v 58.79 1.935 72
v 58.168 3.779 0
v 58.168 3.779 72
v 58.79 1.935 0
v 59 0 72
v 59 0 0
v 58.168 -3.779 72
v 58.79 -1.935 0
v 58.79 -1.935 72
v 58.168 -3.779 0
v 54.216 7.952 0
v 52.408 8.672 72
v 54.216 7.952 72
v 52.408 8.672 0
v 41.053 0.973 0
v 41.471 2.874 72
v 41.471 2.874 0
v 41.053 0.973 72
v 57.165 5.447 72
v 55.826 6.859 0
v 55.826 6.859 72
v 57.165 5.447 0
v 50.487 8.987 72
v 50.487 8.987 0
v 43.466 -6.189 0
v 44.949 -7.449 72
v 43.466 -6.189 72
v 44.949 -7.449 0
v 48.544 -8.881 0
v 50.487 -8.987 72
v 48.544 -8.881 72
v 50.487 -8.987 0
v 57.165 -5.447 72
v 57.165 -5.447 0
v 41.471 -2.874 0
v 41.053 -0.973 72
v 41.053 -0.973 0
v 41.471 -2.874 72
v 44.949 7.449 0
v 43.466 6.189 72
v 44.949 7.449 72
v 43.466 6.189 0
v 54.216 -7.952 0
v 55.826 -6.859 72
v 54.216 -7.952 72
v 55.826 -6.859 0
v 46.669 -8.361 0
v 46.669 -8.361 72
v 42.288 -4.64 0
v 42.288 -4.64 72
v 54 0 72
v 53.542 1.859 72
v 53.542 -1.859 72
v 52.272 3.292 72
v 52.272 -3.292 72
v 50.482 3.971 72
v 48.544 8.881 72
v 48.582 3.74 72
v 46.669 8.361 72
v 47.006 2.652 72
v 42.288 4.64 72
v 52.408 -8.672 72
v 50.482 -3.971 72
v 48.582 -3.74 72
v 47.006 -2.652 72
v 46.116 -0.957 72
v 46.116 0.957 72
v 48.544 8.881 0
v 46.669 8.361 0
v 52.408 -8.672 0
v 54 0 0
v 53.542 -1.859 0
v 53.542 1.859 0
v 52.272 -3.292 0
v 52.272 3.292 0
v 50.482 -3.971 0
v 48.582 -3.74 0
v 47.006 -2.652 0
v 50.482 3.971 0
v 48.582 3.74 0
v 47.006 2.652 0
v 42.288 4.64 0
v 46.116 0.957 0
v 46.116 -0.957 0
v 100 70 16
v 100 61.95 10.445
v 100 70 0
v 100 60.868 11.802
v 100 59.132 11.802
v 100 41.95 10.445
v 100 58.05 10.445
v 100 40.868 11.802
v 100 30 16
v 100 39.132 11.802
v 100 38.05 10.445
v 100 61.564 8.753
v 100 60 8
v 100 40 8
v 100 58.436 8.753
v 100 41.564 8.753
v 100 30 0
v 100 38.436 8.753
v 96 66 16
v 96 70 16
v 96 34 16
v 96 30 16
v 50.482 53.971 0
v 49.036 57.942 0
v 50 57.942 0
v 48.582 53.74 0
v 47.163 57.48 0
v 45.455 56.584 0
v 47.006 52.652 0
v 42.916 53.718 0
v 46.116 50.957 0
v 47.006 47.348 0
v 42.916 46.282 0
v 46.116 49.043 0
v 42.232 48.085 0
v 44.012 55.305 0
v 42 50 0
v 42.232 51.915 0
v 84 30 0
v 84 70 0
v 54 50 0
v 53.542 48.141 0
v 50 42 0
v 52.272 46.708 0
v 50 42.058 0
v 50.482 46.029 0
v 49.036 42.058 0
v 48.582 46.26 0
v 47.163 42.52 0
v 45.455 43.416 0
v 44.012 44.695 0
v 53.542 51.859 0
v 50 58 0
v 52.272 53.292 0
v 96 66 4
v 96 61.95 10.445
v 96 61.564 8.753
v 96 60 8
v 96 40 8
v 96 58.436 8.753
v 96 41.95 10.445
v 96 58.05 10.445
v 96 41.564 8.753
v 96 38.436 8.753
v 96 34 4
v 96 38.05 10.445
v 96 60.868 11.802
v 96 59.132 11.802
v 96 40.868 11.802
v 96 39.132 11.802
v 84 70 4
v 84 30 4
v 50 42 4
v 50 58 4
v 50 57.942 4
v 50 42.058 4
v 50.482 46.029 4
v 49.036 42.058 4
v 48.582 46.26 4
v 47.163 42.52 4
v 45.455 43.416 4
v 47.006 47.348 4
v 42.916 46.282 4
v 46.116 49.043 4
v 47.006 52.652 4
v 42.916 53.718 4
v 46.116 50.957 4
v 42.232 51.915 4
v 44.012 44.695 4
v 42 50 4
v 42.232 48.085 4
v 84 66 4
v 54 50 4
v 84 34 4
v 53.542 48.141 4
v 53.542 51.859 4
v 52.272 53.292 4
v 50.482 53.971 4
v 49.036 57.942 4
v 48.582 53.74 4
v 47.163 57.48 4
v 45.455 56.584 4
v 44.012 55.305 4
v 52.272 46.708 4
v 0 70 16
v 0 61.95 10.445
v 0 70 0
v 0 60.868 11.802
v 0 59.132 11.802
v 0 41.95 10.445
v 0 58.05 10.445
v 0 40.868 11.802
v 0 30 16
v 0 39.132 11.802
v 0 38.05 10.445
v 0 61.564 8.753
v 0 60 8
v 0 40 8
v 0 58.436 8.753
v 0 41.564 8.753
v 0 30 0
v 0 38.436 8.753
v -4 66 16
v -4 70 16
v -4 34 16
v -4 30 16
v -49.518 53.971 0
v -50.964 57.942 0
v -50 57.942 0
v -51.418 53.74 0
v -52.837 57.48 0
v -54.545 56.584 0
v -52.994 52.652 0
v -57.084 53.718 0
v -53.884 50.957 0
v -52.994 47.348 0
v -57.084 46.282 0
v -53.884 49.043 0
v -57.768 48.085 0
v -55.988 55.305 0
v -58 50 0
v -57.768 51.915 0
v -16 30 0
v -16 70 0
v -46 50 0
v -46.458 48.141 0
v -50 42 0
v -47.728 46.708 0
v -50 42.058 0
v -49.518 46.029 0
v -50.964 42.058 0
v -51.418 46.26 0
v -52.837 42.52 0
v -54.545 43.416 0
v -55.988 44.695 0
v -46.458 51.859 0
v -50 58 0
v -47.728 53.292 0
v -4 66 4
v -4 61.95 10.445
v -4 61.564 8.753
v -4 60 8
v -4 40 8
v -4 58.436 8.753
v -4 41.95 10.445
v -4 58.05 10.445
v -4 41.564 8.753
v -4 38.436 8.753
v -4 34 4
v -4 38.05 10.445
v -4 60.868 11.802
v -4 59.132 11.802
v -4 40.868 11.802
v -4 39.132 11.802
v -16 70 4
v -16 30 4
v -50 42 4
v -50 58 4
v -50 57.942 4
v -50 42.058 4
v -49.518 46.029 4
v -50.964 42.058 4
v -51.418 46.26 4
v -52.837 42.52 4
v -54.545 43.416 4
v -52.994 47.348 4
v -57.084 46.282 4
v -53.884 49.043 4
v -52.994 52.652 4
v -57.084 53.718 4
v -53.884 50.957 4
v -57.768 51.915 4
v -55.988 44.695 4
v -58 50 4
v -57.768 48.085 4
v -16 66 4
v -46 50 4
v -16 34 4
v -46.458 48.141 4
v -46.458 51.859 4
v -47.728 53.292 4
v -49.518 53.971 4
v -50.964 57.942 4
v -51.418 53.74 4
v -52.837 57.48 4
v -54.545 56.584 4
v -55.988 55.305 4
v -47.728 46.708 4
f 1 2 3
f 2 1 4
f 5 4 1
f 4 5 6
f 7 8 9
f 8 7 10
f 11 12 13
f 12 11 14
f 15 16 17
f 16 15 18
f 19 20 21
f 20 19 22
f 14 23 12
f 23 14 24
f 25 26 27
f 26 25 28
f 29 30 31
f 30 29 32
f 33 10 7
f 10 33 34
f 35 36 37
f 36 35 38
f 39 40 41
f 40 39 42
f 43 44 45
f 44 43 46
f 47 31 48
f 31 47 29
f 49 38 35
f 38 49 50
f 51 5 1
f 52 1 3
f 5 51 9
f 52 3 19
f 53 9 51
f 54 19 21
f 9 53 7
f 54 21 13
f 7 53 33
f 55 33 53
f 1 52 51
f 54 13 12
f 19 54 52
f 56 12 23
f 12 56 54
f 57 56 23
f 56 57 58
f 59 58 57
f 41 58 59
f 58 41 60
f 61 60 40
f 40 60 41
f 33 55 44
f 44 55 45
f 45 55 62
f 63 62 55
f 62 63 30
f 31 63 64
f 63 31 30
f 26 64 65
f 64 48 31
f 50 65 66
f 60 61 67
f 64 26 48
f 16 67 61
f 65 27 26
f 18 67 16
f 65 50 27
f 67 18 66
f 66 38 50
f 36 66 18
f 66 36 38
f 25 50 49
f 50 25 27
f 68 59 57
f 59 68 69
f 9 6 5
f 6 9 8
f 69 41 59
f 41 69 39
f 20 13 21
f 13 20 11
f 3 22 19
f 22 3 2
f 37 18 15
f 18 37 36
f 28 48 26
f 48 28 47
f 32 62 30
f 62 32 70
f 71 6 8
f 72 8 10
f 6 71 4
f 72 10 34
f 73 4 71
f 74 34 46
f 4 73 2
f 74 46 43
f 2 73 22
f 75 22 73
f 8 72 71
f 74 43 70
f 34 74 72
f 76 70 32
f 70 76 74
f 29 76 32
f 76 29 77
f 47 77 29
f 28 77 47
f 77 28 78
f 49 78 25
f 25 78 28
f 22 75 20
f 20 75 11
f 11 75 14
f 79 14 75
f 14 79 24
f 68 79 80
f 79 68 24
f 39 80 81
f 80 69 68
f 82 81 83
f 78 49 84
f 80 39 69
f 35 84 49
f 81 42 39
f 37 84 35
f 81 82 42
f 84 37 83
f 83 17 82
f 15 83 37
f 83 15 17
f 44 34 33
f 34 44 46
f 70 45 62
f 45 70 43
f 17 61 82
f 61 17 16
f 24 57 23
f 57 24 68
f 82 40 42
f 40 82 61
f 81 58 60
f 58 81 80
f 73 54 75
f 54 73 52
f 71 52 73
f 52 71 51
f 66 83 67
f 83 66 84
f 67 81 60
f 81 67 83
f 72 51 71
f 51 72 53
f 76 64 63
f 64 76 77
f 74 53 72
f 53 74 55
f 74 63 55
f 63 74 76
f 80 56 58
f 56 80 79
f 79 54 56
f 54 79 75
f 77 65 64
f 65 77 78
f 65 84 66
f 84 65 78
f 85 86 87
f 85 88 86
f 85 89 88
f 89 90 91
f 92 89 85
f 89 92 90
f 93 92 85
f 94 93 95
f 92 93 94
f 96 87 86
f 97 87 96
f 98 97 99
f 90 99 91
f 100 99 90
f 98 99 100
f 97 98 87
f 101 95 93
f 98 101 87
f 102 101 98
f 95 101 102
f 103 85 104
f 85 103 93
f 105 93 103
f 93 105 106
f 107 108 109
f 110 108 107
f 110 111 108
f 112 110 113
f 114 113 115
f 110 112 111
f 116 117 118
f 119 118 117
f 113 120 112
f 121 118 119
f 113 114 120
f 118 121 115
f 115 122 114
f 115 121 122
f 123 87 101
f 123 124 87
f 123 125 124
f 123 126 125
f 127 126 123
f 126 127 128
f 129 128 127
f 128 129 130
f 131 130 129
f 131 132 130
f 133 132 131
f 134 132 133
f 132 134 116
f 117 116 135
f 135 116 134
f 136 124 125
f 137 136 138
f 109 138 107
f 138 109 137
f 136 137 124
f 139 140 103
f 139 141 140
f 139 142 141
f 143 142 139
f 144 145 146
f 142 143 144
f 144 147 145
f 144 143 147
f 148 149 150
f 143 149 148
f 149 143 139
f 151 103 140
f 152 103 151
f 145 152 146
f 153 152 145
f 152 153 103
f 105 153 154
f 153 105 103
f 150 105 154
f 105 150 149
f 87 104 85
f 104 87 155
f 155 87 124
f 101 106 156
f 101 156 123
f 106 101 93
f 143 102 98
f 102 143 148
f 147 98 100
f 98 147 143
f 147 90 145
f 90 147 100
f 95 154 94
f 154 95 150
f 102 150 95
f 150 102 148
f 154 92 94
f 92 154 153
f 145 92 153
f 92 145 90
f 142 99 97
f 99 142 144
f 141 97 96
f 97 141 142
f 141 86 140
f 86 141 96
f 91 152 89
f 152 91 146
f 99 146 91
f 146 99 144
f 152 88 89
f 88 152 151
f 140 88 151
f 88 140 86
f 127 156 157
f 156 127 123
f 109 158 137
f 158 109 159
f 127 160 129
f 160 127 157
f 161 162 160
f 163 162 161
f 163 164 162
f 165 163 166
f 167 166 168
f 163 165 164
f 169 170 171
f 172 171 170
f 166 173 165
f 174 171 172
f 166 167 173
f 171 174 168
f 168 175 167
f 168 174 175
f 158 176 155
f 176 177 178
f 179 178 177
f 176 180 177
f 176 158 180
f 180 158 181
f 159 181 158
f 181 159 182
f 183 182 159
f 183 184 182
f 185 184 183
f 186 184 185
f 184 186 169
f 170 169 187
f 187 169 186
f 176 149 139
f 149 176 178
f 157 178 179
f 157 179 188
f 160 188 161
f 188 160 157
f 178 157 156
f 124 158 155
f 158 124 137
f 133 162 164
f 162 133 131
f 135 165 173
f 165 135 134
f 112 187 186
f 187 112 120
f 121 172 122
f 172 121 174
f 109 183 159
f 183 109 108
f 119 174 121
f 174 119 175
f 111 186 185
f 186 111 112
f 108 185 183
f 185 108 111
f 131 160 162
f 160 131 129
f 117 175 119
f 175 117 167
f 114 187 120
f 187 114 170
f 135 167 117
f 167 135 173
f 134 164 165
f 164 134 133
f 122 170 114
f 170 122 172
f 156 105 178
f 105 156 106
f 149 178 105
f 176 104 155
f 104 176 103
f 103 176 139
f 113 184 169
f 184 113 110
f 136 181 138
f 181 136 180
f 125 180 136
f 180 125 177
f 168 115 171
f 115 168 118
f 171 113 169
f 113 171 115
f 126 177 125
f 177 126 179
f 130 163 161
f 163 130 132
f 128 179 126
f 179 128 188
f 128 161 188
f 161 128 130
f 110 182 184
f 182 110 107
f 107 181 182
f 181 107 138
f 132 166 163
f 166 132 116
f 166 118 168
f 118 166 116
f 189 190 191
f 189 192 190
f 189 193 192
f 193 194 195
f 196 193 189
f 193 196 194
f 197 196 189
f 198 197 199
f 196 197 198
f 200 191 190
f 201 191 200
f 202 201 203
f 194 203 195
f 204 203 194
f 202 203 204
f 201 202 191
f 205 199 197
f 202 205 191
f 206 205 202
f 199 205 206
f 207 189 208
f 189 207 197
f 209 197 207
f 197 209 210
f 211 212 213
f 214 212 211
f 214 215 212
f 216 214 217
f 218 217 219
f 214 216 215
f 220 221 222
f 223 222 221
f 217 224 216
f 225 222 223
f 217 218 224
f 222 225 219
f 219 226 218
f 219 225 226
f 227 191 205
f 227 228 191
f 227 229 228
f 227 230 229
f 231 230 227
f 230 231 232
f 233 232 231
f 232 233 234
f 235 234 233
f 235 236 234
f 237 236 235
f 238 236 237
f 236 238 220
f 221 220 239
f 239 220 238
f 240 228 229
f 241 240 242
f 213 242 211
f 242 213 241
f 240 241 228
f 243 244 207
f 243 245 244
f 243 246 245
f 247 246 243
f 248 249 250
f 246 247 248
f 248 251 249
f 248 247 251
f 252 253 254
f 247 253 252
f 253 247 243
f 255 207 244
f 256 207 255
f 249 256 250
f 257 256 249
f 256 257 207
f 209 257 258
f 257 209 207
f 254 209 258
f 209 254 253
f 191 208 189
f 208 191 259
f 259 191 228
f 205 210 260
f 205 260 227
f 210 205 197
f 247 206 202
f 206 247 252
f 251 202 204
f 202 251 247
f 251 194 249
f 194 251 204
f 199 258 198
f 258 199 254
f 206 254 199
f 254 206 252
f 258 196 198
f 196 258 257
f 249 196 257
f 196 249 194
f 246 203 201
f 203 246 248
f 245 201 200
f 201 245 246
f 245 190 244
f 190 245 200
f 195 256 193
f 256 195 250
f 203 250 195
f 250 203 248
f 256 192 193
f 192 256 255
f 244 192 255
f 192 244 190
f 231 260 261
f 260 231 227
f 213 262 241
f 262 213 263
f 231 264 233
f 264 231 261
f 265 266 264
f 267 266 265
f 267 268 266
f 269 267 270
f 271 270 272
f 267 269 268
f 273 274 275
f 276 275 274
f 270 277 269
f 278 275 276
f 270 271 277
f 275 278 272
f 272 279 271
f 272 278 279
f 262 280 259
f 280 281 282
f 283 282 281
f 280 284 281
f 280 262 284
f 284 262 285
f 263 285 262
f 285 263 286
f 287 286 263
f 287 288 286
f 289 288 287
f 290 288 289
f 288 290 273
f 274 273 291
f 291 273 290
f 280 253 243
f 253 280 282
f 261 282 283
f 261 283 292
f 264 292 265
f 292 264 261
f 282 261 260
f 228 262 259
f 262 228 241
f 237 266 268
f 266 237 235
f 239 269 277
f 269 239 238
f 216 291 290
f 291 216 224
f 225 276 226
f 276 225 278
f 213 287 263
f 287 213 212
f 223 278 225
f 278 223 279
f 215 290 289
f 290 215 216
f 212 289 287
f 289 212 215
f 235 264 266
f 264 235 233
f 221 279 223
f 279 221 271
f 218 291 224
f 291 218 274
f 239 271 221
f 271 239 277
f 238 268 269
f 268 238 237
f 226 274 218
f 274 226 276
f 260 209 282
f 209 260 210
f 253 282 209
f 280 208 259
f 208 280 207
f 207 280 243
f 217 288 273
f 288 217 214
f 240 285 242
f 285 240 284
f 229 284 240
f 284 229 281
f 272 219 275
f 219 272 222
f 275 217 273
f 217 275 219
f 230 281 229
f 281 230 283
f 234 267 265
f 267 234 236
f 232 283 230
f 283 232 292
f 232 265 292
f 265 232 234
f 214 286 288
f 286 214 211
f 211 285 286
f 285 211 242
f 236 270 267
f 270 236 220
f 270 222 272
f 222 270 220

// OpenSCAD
    
shaft_d = 8 ;           // Shaft diameter
core_d = 18 ;           // Core diameter
bevel_d = 30 ;          // Bevel inner diameter
outer_d = 40 ;          // Spool outer diameter
crank_hub_d = 25 ;      // Diameter of crank hub
handle_hub_d = 10 ;     // Diameter of handle end of crank
handle_d = 4 ;          // Diameter of handle
base_fix_d = 4 ;        // Diameter of base fixing screw hole

crank_l = 40 ;          // Length of crank (between shaft and handle centres

side_t = 4 ;            // Thickness of spool side
side_rim_t = 2 ;        // Thickness of spool side rim (beveled)
crank_hub_t = 6 ;       // Thickness of crank hub
crank_arm_t = 4 ;       // Thickness of crank arm

spool_w_all = 112 ;     // Width of spool (overall between ends)
spool_w_end = 20 ;      // Width of spool (to inside of end)
spool_w_mid = spool_w_all - 2*spool_w_end ;
                        // width of spool middle spacer

shaft_nut_af = 13 ;     // Nut diameter across faces
shaft_nut_t  = 4 ;      // Nut thickness

handle_nut_af = 7 ;     // Nut diameter across faces
handle_nut_t  = 3 ;     // Nut thickness

winder_side_h = 50 ;    // Height to centre of winder shaft
winder_side_w = 40 ;    // Width base of winder side support
winder_side_t = 4 ;     // Thickness of winder side support
winder_apex_d = 16 ;    // Radius of apex of winder side support
winder_base_t = 16 ;    // Thickness at base of winder

delta = 0.1 ;           // Small value to force overlap
spacing = outer_d+10 ;  // Object spacingh (pitch)
part_gap = 10 ;         // Spacing between exploded assembly parts

// Utilities

module shaft_hole(d, l) {
        translate([0,0,-delta]) {
            cylinder(d=d, h=l+delta*2) ;
        };
}
  
module nut_recess(af, t)  {
    od = af * 2 / sqrt(3) ; // Diameter
    translate([0,0,-delta]) {
        cylinder(d=od, h=t+delta, $fn=6) ;
    }
}

module web_base(w_x, w_y, w_t) {
    // Web with corner on origin, extending along +ve X and Y axes
    // Slight negative x- and y- overlap forces merge with existing shape
    linear_extrude(height=w_t, center=true) {
        polygon(
            points=[
                [-delta, -delta], [-delta, w_y],
                [0, w_y], [w_x, 0],
                [w_x, 0], [w_x, -delta],
                ],
            paths=[[0,1,2,3,4,5,0]]
            ) ;
    }
}

module web_oriented(w_x, w_y, w_t) {
    // Web with corner on origin, extending along +ve or -ve X and Y axes
    if (w_x >= 0)
        {
        if (w_y >= 0)
            {
                web_base(w_x, w_y, w_t) ;
            }
        else // w_y < 0
            {
                // flip through x-z plane: reverse y-axis
                mirror(v=[0,1,0]) web_base(w_x, -w_y, w_t) ;
            }
        }
    else // w_x < 0
        {
        if (w_y >= 0)
            {
                // flip through y-z plane: reverse x-axis
                mirror(v=[1,0,0]) web_base(-w_x, w_y, w_t) ;
            }
        else // w_y < 0
            {
                // flip through x-z and y-z planes: reverse x- and y- axes
                mirror(v=[1,1,0]) web_base(-w_x, -w_y, w_t) ;
            }
        }
 }

module web_xz(x, y, z, w_x, w_z, w_t) {
    // Web in X-Z plane, outer corner at x, y, z
    if (y >= 0) {
        // Rotate around X maps Y to Z, Z to -Y (???)
        translate([x, y - w_t/2, z]) rotate([90,0,0]) web_oriented(w_x, w_z, w_t) ;
    }
    else { // y < 0
        translate([x, y + w_t/2, z]) rotate([90,0,0]) web_oriented(w_x, w_z, w_t) ;
    }
}

// Spool

module spool_edge(shaft_d, core_d, bevel_d, outer_d, side_t, side_rim_t) {
    // Edge in X-Y plane with centre of outer face at (0,0,0)
    union() {
        cylinder(d1=outer_d, d2=outer_d, h=side_rim_t) ;
        translate([0,0,side_rim_t]) {
            cylinder(d1=outer_d, d2=bevel_d, h=side_t-side_rim_t) ;
        } ;
    } ;
}

module pulley(d,t) {
    cylinder(d1=d, d2=d-t, h=t/2+delta) ;
    translate([0,0,t/2])
        cylinder(d1=d-t, d2=d, h=t/2+delta) ;    
}


module spool_core(d_core, w_core) {
    cylinder(d=d_core, h=w_core) ;
}

module half_spool(shaft_d, core_d, bevel_d, outer_d, side_t, side_rim_t, w_spool_end) {
    difference() {
        union() {
            spool_edge(
                shaft_d=shaft_d, core_d=core_d, bevel_d=bevel_d, outer_d=outer_d, 
                side_t=side_t, side_rim_t=side_rim_t
            );
            spool_core(d_core=core_d, w_core=w_spool_end+side_t);
        } ;
        union() {
            shaft_hole(d=shaft_d, l=w_spool_end+side_t) ;
            nut_recess(af=shaft_nut_af, t=shaft_nut_t) ;
        } ;
    }
} ;

module spool_spacer(shaft_d, core_d, w_spacer, w_spool_end) {
    difference() {
        union() {
            spool_core(d_core=core_d, w_core=spool_w_mid);
        } ;
        union() {
            shaft_hole(d=shaft_d, l=spool_w_mid) ;
        } ;
    }
} ;




module crank_handle(
        crank_l, 
        shaft_d, crank_hub_d, handle_hub_d, handle_d, 
        crank_hub_t, crank_arm_t
    ) {
    difference() {
        union() {
            cylinder(d=crank_hub_d, h=crank_hub_t) ;
            translate([0,0,crank_hub_t-delta])
                pulley(crank_hub_d, crank_hub_t) ;
            translate([crank_l/2,0,crank_arm_t/2]) 
                cube(size=[crank_l,handle_hub_d,crank_arm_t], center=true) ;
            translate([crank_l,0,0]) 
                cylinder(d=handle_hub_d, h=crank_hub_t) ;
        } ;
        union() {
            shaft_hole(d=shaft_d, l=crank_hub_t*2) ;
            nut_recess(af=shaft_nut_af, t=shaft_nut_t) ;
            translate([crank_l,0,0]) {
                shaft_hole(d=handle_d, l=crank_hub_t) ;
                nut_recess(af=handle_nut_af, t=handle_nut_t) ;
            }
        } ;
    }
}


module winder_side_support() {
    // Side in X-Y plane, shaft cente at origin, extends along +X axis
    module side_profile() {
        linear_extrude(height=winder_side_t)
            {
            polygon(
                points=[
                    [0,-winder_apex_d/2], [0,winder_apex_d/2],
                    [winder_side_h-winder_base_t,-winder_side_w/2], [winder_side_h-winder_base_t,winder_side_w/2],
                    [winder_side_h,-winder_side_w/2], [winder_side_h,winder_side_w/2]
                    ],
                paths=[[0,2,4,5,3,1,0]]
                ) ;
            }
        }
    module side_apex() {
        cylinder(h=winder_side_t, d=winder_apex_d) ;
        }
    module side_base() {
        translate([winder_side_h-winder_side_t, -winder_side_w/2, 0])
            {
                difference() {
                    cube(size=[winder_side_t, winder_side_w, winder_base_t], center=false) ;
                    translate([0, winder_side_w*0.25, winder_base_t/2+winder_side_t/2])
                        rotate([0,90,0])
                            shaft_hole(base_fix_d, winder_side_t) ;
                    translate([0, winder_side_w*0.75, winder_base_t/2+winder_side_t/2])
                        rotate([0,90,0])
                            shaft_hole(base_fix_d, winder_side_t) ;
                }
            }
        }
    difference()
        {
        union()
            {
                side_profile() ;
                side_apex() ;
                side_base() ;
                web_side = winder_base_t - winder_side_t ;
                web_xz(winder_side_h-winder_side_t, -winder_side_w/2, winder_side_t, -web_side, web_side, winder_side_t) ;
                web_xz(winder_side_h-winder_side_t,  winder_side_w/2, winder_side_t, -web_side, web_side, winder_side_t) ;
            } ;
        union()
            {
                shaft_hole(shaft_d, winder_side_t) ;
            } ;
        }
}

// Tape reader bridge (with lighting groove) and supports

read_l = spool_w_all ;  // Reader bridge length (inner)
read_w = 16 ;           // Width of bridge
read_extra_w = 5 ;      // Extra width for reader bridge for tie-down
read_h = 90 ;           // Height of reader bridge above base plate
read_side_t = side_t ;  // Reader bridge side support thickness
read_side_base_t = 16 ; // Reader bridge side support thickness at base 

read_side_apex_w = 24 ;
read_side_apex_h = 4 ;
read_side_base_w = 40 ;
read_side_peg_d  = 4 ;

read_groove_w = 2.25 ;  // EL wire goove width
read_groove_d = 3 ;     // EL wire groove depth

module tape_reader_bridge() {
    total_l = read_l + 2*(read_side_t + read_extra_w) ;
    difference() {
        rotate([0,90,0])
            cylinder(d=read_w, h=total_l, center=true) ;
        translate([0,0,-read_w/2])
            cube(size=[total_l+delta, read_w+delta, read_w+delta], center=true) ;

        translate([0,0,(read_w-read_groove_d)/2])
            cube(size=[total_l+delta, read_groove_w, read_groove_d], center=true) ;
    }
}

module read_side_support() {
    // Side in X-Y plane, shaft cente at origin, extends along +X axis
    module side_profile() {
        base_h = read_side_t + (read_side_base_t - read_side_t) ;
        linear_extrude(height=winder_side_t)
            {
            polygon(
                points=[
                    [0,-read_w/2], [0,read_w/2],
                    [-read_side_apex_h,-read_w/2], [-read_side_apex_h,read_w/2],
                    [-read_side_apex_h,-read_side_apex_w/2], [-read_side_apex_h,read_side_apex_w/2],
                    [read_h-base_h,-read_side_base_w/2], [read_h-base_h,read_side_base_w/2],
                    [read_h,-read_side_base_w/2], [read_h,read_side_base_w/2],
                    ],
                paths=[[0,2,4,6,8, 9,7,5,3,1, 0]]
                ) ;
            }
        }
    module side_base() {
        translate([read_h-read_side_t, -read_side_base_w/2, 0])
            {
                difference() {
                    cube(size=[read_side_t, read_side_base_w, read_side_base_t], center=false) ;
                    translate([0, read_side_base_w*0.25, read_side_base_t/2+read_side_t/2])
                        rotate([0,90,0])
                            shaft_hole(read_side_peg_d, read_side_t) ;
                    translate([0, read_side_base_w*0.75, read_side_base_t/2+read_side_t/2])
                        rotate([0,90,0])
                            shaft_hole(read_side_peg_d, read_side_t) ;
                }
            }
        }
    difference()
        {
        union()
            {
                side_profile() ;
                side_base() ;
                web_side = read_side_base_t - read_side_t ;
                web_xz(read_h-read_side_t, -read_side_base_w/2, read_side_t, -web_side, web_side, read_side_t) ;
                web_xz(read_h-read_side_t,  read_side_base_w/2, read_side_t, -web_side, web_side, read_side_t) ;
            } ;
        union()
            {
                shaft_hole(shaft_d, read_side_t) ;
                translate([read_h-read_side_base_t-read_side_t, +0.25*read_side_base_w,0])
                    shaft_hole(read_side_peg_d, read_side_t) ;
                translate([read_h-read_side_base_t-read_side_t, -0.25*read_side_base_w,0])
                    shaft_hole(read_side_peg_d, read_side_t) ;
            } ;
        }
}

// Parts for holding phone camera

hold_side_l = 80 ;      // Length is side of holder
hold_side_h = 10 ;      // Height of side above base
hold_side_t1 = 7 ;      // Thickness of side at base
hold_side_t2 = 8 ;      // Thickness of side at top

hold_base_l1 = 60 ;     // Length of base near side
hold_base_l2 = 50 ;     // Length of base towards centre
hold_base_t = 8 ;       // Thickness of base (to accommodate hole)
hold_base_w = 20 ;      // Width of base piece

hold_rail_p = 40 ;      // Distance between rail holes
hold_rail_d = 4 ;       // Diameter of rail holes

hold_fix_p = 25 ;       // Distance between fixing holes
hold_fix_d = 4 ;        // Diameter of fixing holes

hold_fix_t = 6 ;        // Thickness of phone holder-to-rod fixing
hold_fix_w = 8 ;        // Width of phone holder-to-rod fixing
hold_fix_l = 80 ;       // Length of phone holder-to-rod fixing
hold_fix_rod_d = 8 ;    // Diameter of phone holder support rod
hold_fix_hub_d = 16 ;   // Diameter of phone holder support hub

module phone_holder_rod_fixing() {
    module phone_holder_rod_fixing_shape() {
        // Centre hub on origin, extend X axis, lying on Z=0 plane
        union() {
            cylinder(d=hold_fix_hub_d, h=hold_fix_t) ;
            translate([0,-hold_fix_w/2,0])
                cube(size=[hold_fix_l, hold_fix_w, hold_fix_t], center=false) ;
            translate([hold_fix_l,0,0])
                cylinder(d=hold_fix_w, h=hold_fix_t) ;
        }
    }
    difference() {
        phone_holder_rod_fixing_shape() ;
        shaft_hole(hold_fix_rod_d, hold_fix_t ) ;
        translate([0,0,0])
            rotate([0,0,0])
                union() {
                    translate([hold_fix_l-hold_fix_d,0,0])
                        shaft_hole(hold_fix_d, hold_fix_w ) ;
                    translate([hold_fix_l-hold_fix_p-hold_fix_d,0,0])
                        shaft_hole(hold_fix_d, hold_fix_w ) ;
                } ;
    } ;
}

module phone_camera_holder() {
    module phone_holder_base() {
        // Centre baseline on origin, extend X axis, lying on Z=0 plane
        linear_extrude(height=hold_base_t)
            {
            polygon(
                points=[
                    [-hold_base_l1/2,0], [+hold_base_l1/2,0],
                    [-hold_base_l2/2,hold_base_w], [+hold_base_l2/2,hold_base_w]
                    ],
                paths=[[0,2,3,1,0]]
                ) ;
            }
        }
    module phone_holder_side() {
        // Thinner edge on Y axis, centred on X axis
        rotate([0,-90,0])
            linear_extrude(height=hold_side_l, center=true)
                {
                polygon(
                    points=[
                        [0, -delta], 
                        [hold_side_t1,-delta],
                        [-delta,hold_side_h], 
                        [hold_side_t2,hold_side_h],
                        ],
                    paths=[[0,2,3,1,0]]
                    ) ;
                } ;
        }
    difference() {
        union() {
            rotate([90,0,0]) {
                    phone_holder_base() ;
                }
            phone_holder_side() ;
            } ;
        union() {
            translate([-hold_rail_p/2,-hold_base_t/2,0])
                shaft_hole(hold_rail_d, hold_base_w) ;
            translate([+hold_rail_p/2,-hold_base_t/2,0])
                shaft_hole(hold_rail_d, hold_base_w) ;
            translate([-hold_fix_p/2,hold_side_h,hold_side_t2/2])
                rotate([90,0,0])
                    shaft_hole(hold_fix_d, hold_base_t+hold_side_h);
            translate([+hold_fix_p/2,hold_side_h,hold_side_t2/2])
                rotate([90,0,0])
                    shaft_hole(hold_fix_d, hold_base_t+hold_side_h);
            } ;
        }
    }


// Bracket to hold phone camera support rod

rod_support_h = 40 ;
rod_support_t = side_t ;  // Rod support side support thickness
rod_support_base_t = 16 ; // Rod support side support thickness at base 

rod_support_apex_w = 24 ;
rod_support_base_w = 45 ;
    
 module phone_holder_rod_support() {
    // Side in X-Y plane, shaft cente at origin, extends along +X axis
    module side_profile() {
        linear_extrude(height=winder_side_t) {
            polygon(
                points=[
                    [0,-rod_support_apex_w/2], [0,rod_support_apex_w/2],
                    [rod_support_h-rod_support_base_t,-rod_support_base_w/2], [rod_support_h-rod_support_base_t,rod_support_base_w/2],
                    [rod_support_h,-rod_support_base_w/2], [rod_support_h,rod_support_base_w/2],
                    ],
                paths=[[0,2,4,6,8, 9,7,5,3,1, 0]]
                ) ;
        }
    }
    module side_base() {
        translate([rod_support_h-rod_support_t, -rod_support_base_w/2, 0]) {
            difference() {
                cube(size=[rod_support_t, rod_support_base_w, rod_support_base_t], center=false) ;
                translate([0, rod_support_base_w*0.25, rod_support_base_t/2+rod_support_t/2])
                    rotate([0,90,0])
                        shaft_hole(base_fix_d, rod_support_t) ;
                translate([0, rod_support_base_w*0.75, rod_support_base_t/2+rod_support_t/2])
                    rotate([0,90,0])
                        shaft_hole(base_fix_d, rod_support_t) ;
            }
        }
    }
    module rod_holder() {
        // Rod support block centred on X-Y plane, rod hole aligned with X-axis
        // @@QUESTIONB: Should this be spaced away from the side plate to allow a nut on the rod?
        holder_wdth = hold_fix_rod_d*2 ;
        holder_dpth = rod_support_t*2+hold_fix_rod_d ;
        difference() {
            union() {               
                translate([0,0,holder_wdth/4])
                    cube(size=[rod_support_t, holder_wdth, holder_wdth/2], center=true) ;
                translate([0,0,holder_dpth/2])
                    rotate([0,90,0])
                        cylinder(d=holder_dpth,h=rod_support_t, center=true) ;
            }
            translate([-rod_support_t/2,0,rod_support_t+hold_fix_rod_d/2])
                rotate([0,90,0])
                    shaft_hole(hold_fix_rod_d, rod_support_t) ;
        }
    }
    union() {
        side_profile() ;
        side_base() ;
        translate([rod_support_t/2,0,0])
            rod_holder() ;
        translate([rod_support_h*0.75,0,0])
            rod_holder() ;
        web_side = rod_support_base_t - rod_support_t ;
        web_xz(rod_support_h-rod_support_t, -rod_support_base_w/2, rod_support_t, -web_side, web_side, rod_support_t) ;
        web_xz(rod_support_h-rod_support_t,  rod_support_base_w/2, rod_support_t, -web_side, web_side, rod_support_t) ;
    } ;
}


module winder_assembly() {
    // Spool and crank handle
    spool_pos_x   = side_t + spool_w/2 + part_gap/2 ;
    winder_side_x = winder_side_t + spool_w/2 + part_gap/2 + part_gap ;
    winder_pos_x  = winder_side_x + 2*part_gap ;
    translate([-spool_pos_x,0,winder_side_h])
        rotate([0,90,0])
            half_spool(
                shaft_d=shaft_d, core_d=core_d, bevel_d=bevel_d, outer_d=outer_d, 
                side_t=side_t, side_rim_t=side_rim_t, w_spool_end=spool_w_end
                );
    translate([spool_pos_x,0,winder_side_h])
        rotate([0,-90,0])
            half_spool(
                shaft_d=shaft_d, core_d=core_d, bevel_d=bevel_d, outer_d=outer_d, 
                side_t=side_t, side_rim_t=side_rim_t, w_spool_end=spool_w_end
                );
    translate([winder_pos_x,0,winder_side_h])
        rotate([-45,0,0])
            rotate([0,90,0])
                crank_handle(
                    crank_l=crank_l, 
                    shaft_d=shaft_d, crank_hub_d=crank_hub_d, 
                    handle_hub_d=handle_hub_d, handle_d=handle_d, 
                    crank_hub_t=crank_hub_t, crank_arm_t=crank_arm_t
                    ) ;
    // Winder supports
    translate([winder_side_x,0,winder_side_h])
        rotate([0,90,180])
            winder_side_support() ;
    translate([-winder_side_x,0,winder_side_h])
        rotate([0,90,0])
            winder_side_support() ;
}

module read_bridge_assembly() {
    // Reader bridge and support
    side_support_x = side_t + part_gap + spool_end_w + part_gap/2 ;
    translate([0,0,read_h])
        tape_reader_bridge() ;
    translate([side_support_x,0,read_h])
        rotate([0,90,180])
            read_side_support() ;
    translate([-side_support_x,0,read_h])
        rotate([0,90,0])
            read_side_support() ;
}

module phone_holder_assembly() {
    // Phone/camera holder
    holder_spacing = hold_base_w + part_gap ;
    holder_height  = read_h*1.75 ;
    rod_fix_x = hold_fix_l - hold_fix_d - hold_fix_p/2 ;
    rod_fix_y = holder_spacing - hold_fix_w/2 ;
    rod_fix_z = holder_height + hold_base_t + part_gap ;
    rod_holder_x = rod_fix_x + rod_support_t + hold_fix_rod_d/2 ;
    translate([0,-holder_spacing,holder_height])
        rotate([-90,0,0])
            phone_camera_holder() ;
    translate([0,holder_spacing,holder_height])
        rotate([-90,0,180])
            phone_camera_holder() ;
    translate([-rod_fix_x,rod_fix_y,rod_fix_z])
        rotate([0,0,0])
            phone_holder_rod_fixing() ;
    translate([-rod_holder_x,rod_fix_y,rod_support_h])
        rotate([0,90,0])
            phone_holder_rod_support() ;    
}

module layout_assembly() {
    // Render and place parts for printing
    winder_reader_spacing = 90 ;
    translate([0,-winder_reader_spacing,0])
        winder_assembly() ;
    translate([0,winder_reader_spacing,0])
        winder_assembly() ;
    // Reader bridge and support
    translate([0,0,0])
        read_bridge_assembly() ;
    // Phone/camera holder
    translate([0,0,0])
        phone_holder_assembly() ;
}



module layout_print_xz() {
    // Render and place parts for printing

    // Spool and crank handle
    translate([-spacing,0,0])
        half_spool(
            shaft_d=shaft_d, core_d=core_d, bevel_d=bevel_d, outer_d=outer_d, 
            side_t=side_t, side_rim_t=side_rim_t, w_spool_end=spool_w_end
            );
    translate([0,0,0])
        half_spool(
            shaft_d=shaft_d, core_d=core_d, bevel_d=bevel_d, outer_d=outer_d, 
            side_t=side_t, side_rim_t=side_rim_t, w_spool_end=spool_w_end
            );
    translate([spacing,0,0])
        crank_handle(
            crank_l=crank_l, 
            shaft_d=shaft_d, crank_hub_d=crank_hub_d, 
            handle_hub_d=handle_hub_d, handle_d=handle_d, 
            crank_hub_t=crank_hub_t, crank_arm_t=crank_arm_t
            ) ;
    
    // Winder supports
    translate([spacing,spacing,0])
        winder_side_support() ;
    translate([-spacing,spacing,0])
        winder_side_support() ;
    
    // Reader bridge and support
    translate([-spacing,2*spacing,0])
        tape_reader_bridge() ;
    translate([0,2*spacing,0])
        read_side_support() ;
    translate([0,3*spacing,0])
        read_side_support() ;
    
    // Phone/camera holder
    translate([-spacing,5*spacing,0])
        phone_camera_holder() ;
    translate([spacing,5*spacing,0])
        phone_camera_holder() ;
    translate([0,6*spacing,0])
        phone_holder_rod_support() ;    
    translate([0,7*spacing,0])
        phone_holder_rod_fixing() ;
}

module layout_print_1() {
    // Cur down
    // Spools
    translate([spacing*1,0,0])
        spool_spacer(shaft_d=shaft_d, core_d=core_d, w_spacer=spool_w_mid, w_spool_end=spool_w_end) ;    

    // Winder supports
    translate([spacing,spacing,0])
        winder_side_support() ;
    translate([-spacing,spacing,0])
        winder_side_support() ;
}



module layout_print_1a() {
    // Spools
    translate([-spacing,0,0])
        half_spool(
            shaft_d=shaft_d, core_d=core_d, bevel_d=bevel_d, outer_d=outer_d, 
            side_t=side_t, side_rim_t=side_rim_t, w_spool_end=spool_w_end
            );
    translate([0,0,0])
        half_spool(
            shaft_d=shaft_d, core_d=core_d, bevel_d=bevel_d, outer_d=outer_d, 
            side_t=side_t, side_rim_t=side_rim_t, w_spool_end=spool_w_end
            );
    translate([spacing*1,0,0])
        spool_spacer(shaft_d=shaft_d, core_d=core_d, w_spacer=spool_w_mid, w_spool_end=spool_w_end) ;

    // Crank handle
    translate([0, spacing*2,0])
        crank_handle(
            crank_l=crank_l, 
            shaft_d=shaft_d, crank_hub_d=crank_hub_d, 
            handle_hub_d=handle_hub_d, handle_d=handle_d, 
            crank_hub_t=crank_hub_t, crank_arm_t=crank_arm_t
            ) ;
    
    // Winder supports
    translate([spacing,spacing,0])
        winder_side_support() ;
    translate([-spacing,spacing,0])
        winder_side_support() ;
}

module layout_print_2() {
    // Reader bridge and support
    translate([
    0,1*spacing,0])
        tape_reader_bridge() ;
    translate([-winder_side_h/2,spacing*2,0])
        read_side_support() ;
    translate([-winder_side_h/2,3*spacing,0])
        read_side_support() ;
}

module layout_print_3() {
    // Phone/camera holder
    translate([-spacing,0*spacing,0])
        phone_camera_holder() ;
    translate([spacing,0*spacing,0])
        phone_camera_holder() ;
    translate([0,1*spacing,0])
        phone_holder_rod_support() ;    
    translate([0,2*spacing,0])
        phone_holder_rod_fixing() ;
}

module layout_print() {
    // Render and place parts for printing
    translate([spacing,0*spacing,0])
        layout_print_1() ;
    translate([spacing,3*spacing,0])
        layout_print_2() ;
    translate([spacing,9*spacing,0])
        layout_print_3() ;
}

// layout_assembly() ;

// layout_print() ;

layout_print_1() ;
// layout_print_2() ;
// layout_print_3() ;

// spool_spacer(shaft_d=shaft_d, core_d=core_d, w_spacer=spool_w_mid, w_spool_end=spool_w_end) ;

//        crank_handle(
//            crank_l=crank_l, 
//            shaft_d=shaft_d, crank_hub_d=crank_hub_d, 
//            handle_hub_d=handle_hub_d, handle_d=handle_d, 
//            crank_hub_t=crank_hub_t, crank_arm_t=crank_arm_t
//            ) ;
//
//
//    translate([2*spacing,0,0])
//        pulley(crank_hub_d, 4) ;
